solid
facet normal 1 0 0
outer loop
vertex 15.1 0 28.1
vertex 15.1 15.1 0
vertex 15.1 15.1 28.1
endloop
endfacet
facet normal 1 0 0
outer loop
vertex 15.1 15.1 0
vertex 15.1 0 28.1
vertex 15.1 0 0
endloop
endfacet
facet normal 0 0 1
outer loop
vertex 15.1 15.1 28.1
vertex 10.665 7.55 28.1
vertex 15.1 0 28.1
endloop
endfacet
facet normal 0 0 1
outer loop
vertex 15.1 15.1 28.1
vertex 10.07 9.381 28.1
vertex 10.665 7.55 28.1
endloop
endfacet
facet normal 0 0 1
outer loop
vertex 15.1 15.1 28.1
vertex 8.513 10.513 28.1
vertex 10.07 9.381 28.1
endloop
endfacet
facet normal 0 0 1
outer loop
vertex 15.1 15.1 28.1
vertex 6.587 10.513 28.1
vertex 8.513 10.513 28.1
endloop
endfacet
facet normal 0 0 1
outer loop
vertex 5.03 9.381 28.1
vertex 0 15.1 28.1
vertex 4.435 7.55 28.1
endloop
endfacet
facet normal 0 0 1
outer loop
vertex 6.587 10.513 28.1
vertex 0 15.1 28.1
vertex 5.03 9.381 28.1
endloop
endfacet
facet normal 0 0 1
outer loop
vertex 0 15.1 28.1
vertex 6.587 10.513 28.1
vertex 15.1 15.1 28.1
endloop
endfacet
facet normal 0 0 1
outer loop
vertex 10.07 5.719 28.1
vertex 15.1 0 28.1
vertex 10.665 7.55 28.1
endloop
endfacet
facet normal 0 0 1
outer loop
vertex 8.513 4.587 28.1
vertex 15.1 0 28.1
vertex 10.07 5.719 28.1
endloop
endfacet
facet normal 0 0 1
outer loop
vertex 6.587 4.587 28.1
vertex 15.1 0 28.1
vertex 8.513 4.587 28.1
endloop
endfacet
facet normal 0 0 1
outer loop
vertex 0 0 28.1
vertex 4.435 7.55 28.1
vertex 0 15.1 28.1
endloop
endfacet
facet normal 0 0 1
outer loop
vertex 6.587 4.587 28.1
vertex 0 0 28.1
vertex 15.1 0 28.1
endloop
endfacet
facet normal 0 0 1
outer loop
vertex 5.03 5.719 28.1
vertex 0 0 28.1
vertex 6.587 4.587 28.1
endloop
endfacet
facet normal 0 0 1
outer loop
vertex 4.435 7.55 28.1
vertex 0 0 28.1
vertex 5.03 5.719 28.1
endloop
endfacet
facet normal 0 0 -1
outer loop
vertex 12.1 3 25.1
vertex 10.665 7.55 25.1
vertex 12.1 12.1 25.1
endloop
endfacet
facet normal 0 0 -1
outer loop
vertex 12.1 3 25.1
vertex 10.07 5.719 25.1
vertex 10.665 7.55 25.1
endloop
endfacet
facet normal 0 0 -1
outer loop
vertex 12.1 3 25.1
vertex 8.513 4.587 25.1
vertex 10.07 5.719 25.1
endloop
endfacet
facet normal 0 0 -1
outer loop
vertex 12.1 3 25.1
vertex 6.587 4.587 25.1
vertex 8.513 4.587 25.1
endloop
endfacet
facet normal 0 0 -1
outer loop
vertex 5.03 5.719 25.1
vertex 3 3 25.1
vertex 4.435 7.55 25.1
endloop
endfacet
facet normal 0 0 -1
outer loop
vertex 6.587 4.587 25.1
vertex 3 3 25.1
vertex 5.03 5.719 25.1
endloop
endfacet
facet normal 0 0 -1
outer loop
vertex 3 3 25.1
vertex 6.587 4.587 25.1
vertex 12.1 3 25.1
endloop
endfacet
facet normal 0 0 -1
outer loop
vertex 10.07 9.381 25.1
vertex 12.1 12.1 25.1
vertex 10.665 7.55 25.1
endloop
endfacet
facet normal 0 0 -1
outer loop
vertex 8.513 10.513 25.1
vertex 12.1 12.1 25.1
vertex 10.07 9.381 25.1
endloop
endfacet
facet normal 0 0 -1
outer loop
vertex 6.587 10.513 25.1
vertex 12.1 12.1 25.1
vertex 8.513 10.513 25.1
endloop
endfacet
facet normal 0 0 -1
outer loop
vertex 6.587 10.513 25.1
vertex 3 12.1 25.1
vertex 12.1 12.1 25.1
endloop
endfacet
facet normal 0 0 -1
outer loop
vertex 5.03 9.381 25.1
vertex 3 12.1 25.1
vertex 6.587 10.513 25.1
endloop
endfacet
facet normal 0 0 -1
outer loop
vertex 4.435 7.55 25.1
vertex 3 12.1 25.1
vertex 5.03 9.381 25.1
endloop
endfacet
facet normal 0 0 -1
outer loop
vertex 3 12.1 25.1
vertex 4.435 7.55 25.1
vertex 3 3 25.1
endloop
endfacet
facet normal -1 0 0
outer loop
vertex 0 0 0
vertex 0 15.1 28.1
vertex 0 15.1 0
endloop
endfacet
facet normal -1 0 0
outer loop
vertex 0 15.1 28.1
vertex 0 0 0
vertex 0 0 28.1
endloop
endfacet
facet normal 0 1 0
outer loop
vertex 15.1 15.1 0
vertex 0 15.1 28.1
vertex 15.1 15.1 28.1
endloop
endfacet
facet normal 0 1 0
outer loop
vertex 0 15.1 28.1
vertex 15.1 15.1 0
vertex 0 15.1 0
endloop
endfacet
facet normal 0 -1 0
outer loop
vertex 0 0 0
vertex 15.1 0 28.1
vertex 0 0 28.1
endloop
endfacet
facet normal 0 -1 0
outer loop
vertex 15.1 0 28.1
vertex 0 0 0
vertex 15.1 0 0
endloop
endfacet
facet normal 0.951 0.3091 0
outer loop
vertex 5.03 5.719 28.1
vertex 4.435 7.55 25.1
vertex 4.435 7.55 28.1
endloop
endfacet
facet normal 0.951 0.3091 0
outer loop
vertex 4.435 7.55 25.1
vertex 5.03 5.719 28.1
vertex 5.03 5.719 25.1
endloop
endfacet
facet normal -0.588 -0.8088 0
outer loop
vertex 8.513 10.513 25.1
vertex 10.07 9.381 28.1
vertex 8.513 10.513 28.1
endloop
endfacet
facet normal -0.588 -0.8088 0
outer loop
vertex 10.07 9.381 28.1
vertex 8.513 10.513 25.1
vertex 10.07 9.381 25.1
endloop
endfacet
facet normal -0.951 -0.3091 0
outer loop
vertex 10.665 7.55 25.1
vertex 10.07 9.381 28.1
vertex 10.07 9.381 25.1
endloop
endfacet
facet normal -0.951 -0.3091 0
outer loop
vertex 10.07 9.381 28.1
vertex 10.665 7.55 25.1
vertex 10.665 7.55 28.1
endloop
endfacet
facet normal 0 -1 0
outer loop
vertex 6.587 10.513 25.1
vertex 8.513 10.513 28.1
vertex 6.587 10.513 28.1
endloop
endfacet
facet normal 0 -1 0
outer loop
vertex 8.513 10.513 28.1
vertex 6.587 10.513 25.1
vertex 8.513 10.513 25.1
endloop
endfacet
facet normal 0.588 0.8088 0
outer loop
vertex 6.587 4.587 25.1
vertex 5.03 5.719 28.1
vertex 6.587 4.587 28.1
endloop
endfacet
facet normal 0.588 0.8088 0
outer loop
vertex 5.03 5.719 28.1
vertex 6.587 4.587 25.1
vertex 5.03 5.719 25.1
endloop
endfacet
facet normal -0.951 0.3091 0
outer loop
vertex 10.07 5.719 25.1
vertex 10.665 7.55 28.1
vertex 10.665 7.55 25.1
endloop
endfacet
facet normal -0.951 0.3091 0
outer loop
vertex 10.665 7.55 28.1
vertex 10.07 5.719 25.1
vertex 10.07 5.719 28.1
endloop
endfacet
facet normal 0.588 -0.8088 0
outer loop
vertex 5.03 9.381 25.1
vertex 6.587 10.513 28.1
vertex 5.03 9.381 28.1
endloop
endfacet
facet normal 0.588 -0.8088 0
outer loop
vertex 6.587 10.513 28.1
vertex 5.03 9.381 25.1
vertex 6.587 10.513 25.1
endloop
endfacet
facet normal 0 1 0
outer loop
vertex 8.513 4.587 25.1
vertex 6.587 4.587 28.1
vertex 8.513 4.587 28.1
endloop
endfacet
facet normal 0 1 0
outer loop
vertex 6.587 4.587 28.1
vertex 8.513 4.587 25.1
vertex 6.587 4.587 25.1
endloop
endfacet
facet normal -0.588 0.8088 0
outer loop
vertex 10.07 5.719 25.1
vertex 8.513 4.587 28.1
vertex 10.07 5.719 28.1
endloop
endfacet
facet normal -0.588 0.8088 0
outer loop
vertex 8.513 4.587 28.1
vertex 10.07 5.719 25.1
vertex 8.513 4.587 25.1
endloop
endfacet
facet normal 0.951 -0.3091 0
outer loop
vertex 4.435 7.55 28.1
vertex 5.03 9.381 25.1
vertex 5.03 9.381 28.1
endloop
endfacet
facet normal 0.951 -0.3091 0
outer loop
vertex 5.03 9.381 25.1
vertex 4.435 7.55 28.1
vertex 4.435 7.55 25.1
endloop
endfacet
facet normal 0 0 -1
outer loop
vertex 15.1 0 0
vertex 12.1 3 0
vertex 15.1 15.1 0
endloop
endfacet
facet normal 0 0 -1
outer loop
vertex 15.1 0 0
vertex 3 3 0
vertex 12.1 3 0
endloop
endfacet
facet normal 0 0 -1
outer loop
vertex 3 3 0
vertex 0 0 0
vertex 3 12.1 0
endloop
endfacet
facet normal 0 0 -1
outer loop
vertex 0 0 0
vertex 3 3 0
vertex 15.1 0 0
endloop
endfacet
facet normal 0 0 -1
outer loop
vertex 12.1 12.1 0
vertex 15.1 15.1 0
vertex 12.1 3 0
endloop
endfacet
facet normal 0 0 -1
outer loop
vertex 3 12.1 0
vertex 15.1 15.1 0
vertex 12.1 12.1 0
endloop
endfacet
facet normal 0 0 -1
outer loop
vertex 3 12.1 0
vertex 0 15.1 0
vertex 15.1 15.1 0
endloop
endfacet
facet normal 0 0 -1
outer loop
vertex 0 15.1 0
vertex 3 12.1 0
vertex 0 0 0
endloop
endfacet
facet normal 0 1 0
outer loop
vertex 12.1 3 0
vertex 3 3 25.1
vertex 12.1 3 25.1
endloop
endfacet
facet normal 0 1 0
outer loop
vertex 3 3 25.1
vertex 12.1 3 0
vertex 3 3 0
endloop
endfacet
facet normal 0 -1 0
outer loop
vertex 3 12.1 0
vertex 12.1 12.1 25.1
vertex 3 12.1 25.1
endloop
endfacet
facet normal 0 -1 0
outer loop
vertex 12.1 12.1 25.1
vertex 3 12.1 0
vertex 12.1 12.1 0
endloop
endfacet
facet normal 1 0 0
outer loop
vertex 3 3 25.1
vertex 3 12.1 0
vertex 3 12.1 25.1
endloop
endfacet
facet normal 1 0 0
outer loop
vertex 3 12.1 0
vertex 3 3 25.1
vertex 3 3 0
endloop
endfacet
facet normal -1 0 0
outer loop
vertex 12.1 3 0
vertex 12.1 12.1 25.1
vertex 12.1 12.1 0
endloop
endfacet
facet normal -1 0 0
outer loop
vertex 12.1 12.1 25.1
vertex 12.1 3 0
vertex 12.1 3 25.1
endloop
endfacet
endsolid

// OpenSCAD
h_os = 28.1; // height, outside
w_os = 15.1; // width, outside
d_os = 15.1; // depth, outside
material = 3; // 3mm MDF
tube_diam = 6.23; // 0.2ml PCR tube has a maximum diameter of 6.23mm

// inner box

// sensing assembly
color([0,0,1,0.3]) cube([w_os,material,h_os - material]);
translate([0,d_os - material,0]) color([0,0,1,0.3]) cube([w_os,material,h_os - material]);
// LED piece
translate([0,material,0]) color([0,0,1,0.3]) cube([material,d_os - 2*material,h_os - material]);
// sensor piece
translate([w_os - material,material,0]) color([0,0,1,0.3]) cube([material,d_os - 2*material,h_os - material]);
// top piece
difference() {
   translate([0,0,h_os-material]) color([0,0,1,0.3]) cube([w_os, d_os, material]);
   translate([w_os / 2,w_os / 2,h_os-material]) color([0,0,1,0.3]) cylinder(material, tube_diam / 2, tube_diam / 2, 0);
}
